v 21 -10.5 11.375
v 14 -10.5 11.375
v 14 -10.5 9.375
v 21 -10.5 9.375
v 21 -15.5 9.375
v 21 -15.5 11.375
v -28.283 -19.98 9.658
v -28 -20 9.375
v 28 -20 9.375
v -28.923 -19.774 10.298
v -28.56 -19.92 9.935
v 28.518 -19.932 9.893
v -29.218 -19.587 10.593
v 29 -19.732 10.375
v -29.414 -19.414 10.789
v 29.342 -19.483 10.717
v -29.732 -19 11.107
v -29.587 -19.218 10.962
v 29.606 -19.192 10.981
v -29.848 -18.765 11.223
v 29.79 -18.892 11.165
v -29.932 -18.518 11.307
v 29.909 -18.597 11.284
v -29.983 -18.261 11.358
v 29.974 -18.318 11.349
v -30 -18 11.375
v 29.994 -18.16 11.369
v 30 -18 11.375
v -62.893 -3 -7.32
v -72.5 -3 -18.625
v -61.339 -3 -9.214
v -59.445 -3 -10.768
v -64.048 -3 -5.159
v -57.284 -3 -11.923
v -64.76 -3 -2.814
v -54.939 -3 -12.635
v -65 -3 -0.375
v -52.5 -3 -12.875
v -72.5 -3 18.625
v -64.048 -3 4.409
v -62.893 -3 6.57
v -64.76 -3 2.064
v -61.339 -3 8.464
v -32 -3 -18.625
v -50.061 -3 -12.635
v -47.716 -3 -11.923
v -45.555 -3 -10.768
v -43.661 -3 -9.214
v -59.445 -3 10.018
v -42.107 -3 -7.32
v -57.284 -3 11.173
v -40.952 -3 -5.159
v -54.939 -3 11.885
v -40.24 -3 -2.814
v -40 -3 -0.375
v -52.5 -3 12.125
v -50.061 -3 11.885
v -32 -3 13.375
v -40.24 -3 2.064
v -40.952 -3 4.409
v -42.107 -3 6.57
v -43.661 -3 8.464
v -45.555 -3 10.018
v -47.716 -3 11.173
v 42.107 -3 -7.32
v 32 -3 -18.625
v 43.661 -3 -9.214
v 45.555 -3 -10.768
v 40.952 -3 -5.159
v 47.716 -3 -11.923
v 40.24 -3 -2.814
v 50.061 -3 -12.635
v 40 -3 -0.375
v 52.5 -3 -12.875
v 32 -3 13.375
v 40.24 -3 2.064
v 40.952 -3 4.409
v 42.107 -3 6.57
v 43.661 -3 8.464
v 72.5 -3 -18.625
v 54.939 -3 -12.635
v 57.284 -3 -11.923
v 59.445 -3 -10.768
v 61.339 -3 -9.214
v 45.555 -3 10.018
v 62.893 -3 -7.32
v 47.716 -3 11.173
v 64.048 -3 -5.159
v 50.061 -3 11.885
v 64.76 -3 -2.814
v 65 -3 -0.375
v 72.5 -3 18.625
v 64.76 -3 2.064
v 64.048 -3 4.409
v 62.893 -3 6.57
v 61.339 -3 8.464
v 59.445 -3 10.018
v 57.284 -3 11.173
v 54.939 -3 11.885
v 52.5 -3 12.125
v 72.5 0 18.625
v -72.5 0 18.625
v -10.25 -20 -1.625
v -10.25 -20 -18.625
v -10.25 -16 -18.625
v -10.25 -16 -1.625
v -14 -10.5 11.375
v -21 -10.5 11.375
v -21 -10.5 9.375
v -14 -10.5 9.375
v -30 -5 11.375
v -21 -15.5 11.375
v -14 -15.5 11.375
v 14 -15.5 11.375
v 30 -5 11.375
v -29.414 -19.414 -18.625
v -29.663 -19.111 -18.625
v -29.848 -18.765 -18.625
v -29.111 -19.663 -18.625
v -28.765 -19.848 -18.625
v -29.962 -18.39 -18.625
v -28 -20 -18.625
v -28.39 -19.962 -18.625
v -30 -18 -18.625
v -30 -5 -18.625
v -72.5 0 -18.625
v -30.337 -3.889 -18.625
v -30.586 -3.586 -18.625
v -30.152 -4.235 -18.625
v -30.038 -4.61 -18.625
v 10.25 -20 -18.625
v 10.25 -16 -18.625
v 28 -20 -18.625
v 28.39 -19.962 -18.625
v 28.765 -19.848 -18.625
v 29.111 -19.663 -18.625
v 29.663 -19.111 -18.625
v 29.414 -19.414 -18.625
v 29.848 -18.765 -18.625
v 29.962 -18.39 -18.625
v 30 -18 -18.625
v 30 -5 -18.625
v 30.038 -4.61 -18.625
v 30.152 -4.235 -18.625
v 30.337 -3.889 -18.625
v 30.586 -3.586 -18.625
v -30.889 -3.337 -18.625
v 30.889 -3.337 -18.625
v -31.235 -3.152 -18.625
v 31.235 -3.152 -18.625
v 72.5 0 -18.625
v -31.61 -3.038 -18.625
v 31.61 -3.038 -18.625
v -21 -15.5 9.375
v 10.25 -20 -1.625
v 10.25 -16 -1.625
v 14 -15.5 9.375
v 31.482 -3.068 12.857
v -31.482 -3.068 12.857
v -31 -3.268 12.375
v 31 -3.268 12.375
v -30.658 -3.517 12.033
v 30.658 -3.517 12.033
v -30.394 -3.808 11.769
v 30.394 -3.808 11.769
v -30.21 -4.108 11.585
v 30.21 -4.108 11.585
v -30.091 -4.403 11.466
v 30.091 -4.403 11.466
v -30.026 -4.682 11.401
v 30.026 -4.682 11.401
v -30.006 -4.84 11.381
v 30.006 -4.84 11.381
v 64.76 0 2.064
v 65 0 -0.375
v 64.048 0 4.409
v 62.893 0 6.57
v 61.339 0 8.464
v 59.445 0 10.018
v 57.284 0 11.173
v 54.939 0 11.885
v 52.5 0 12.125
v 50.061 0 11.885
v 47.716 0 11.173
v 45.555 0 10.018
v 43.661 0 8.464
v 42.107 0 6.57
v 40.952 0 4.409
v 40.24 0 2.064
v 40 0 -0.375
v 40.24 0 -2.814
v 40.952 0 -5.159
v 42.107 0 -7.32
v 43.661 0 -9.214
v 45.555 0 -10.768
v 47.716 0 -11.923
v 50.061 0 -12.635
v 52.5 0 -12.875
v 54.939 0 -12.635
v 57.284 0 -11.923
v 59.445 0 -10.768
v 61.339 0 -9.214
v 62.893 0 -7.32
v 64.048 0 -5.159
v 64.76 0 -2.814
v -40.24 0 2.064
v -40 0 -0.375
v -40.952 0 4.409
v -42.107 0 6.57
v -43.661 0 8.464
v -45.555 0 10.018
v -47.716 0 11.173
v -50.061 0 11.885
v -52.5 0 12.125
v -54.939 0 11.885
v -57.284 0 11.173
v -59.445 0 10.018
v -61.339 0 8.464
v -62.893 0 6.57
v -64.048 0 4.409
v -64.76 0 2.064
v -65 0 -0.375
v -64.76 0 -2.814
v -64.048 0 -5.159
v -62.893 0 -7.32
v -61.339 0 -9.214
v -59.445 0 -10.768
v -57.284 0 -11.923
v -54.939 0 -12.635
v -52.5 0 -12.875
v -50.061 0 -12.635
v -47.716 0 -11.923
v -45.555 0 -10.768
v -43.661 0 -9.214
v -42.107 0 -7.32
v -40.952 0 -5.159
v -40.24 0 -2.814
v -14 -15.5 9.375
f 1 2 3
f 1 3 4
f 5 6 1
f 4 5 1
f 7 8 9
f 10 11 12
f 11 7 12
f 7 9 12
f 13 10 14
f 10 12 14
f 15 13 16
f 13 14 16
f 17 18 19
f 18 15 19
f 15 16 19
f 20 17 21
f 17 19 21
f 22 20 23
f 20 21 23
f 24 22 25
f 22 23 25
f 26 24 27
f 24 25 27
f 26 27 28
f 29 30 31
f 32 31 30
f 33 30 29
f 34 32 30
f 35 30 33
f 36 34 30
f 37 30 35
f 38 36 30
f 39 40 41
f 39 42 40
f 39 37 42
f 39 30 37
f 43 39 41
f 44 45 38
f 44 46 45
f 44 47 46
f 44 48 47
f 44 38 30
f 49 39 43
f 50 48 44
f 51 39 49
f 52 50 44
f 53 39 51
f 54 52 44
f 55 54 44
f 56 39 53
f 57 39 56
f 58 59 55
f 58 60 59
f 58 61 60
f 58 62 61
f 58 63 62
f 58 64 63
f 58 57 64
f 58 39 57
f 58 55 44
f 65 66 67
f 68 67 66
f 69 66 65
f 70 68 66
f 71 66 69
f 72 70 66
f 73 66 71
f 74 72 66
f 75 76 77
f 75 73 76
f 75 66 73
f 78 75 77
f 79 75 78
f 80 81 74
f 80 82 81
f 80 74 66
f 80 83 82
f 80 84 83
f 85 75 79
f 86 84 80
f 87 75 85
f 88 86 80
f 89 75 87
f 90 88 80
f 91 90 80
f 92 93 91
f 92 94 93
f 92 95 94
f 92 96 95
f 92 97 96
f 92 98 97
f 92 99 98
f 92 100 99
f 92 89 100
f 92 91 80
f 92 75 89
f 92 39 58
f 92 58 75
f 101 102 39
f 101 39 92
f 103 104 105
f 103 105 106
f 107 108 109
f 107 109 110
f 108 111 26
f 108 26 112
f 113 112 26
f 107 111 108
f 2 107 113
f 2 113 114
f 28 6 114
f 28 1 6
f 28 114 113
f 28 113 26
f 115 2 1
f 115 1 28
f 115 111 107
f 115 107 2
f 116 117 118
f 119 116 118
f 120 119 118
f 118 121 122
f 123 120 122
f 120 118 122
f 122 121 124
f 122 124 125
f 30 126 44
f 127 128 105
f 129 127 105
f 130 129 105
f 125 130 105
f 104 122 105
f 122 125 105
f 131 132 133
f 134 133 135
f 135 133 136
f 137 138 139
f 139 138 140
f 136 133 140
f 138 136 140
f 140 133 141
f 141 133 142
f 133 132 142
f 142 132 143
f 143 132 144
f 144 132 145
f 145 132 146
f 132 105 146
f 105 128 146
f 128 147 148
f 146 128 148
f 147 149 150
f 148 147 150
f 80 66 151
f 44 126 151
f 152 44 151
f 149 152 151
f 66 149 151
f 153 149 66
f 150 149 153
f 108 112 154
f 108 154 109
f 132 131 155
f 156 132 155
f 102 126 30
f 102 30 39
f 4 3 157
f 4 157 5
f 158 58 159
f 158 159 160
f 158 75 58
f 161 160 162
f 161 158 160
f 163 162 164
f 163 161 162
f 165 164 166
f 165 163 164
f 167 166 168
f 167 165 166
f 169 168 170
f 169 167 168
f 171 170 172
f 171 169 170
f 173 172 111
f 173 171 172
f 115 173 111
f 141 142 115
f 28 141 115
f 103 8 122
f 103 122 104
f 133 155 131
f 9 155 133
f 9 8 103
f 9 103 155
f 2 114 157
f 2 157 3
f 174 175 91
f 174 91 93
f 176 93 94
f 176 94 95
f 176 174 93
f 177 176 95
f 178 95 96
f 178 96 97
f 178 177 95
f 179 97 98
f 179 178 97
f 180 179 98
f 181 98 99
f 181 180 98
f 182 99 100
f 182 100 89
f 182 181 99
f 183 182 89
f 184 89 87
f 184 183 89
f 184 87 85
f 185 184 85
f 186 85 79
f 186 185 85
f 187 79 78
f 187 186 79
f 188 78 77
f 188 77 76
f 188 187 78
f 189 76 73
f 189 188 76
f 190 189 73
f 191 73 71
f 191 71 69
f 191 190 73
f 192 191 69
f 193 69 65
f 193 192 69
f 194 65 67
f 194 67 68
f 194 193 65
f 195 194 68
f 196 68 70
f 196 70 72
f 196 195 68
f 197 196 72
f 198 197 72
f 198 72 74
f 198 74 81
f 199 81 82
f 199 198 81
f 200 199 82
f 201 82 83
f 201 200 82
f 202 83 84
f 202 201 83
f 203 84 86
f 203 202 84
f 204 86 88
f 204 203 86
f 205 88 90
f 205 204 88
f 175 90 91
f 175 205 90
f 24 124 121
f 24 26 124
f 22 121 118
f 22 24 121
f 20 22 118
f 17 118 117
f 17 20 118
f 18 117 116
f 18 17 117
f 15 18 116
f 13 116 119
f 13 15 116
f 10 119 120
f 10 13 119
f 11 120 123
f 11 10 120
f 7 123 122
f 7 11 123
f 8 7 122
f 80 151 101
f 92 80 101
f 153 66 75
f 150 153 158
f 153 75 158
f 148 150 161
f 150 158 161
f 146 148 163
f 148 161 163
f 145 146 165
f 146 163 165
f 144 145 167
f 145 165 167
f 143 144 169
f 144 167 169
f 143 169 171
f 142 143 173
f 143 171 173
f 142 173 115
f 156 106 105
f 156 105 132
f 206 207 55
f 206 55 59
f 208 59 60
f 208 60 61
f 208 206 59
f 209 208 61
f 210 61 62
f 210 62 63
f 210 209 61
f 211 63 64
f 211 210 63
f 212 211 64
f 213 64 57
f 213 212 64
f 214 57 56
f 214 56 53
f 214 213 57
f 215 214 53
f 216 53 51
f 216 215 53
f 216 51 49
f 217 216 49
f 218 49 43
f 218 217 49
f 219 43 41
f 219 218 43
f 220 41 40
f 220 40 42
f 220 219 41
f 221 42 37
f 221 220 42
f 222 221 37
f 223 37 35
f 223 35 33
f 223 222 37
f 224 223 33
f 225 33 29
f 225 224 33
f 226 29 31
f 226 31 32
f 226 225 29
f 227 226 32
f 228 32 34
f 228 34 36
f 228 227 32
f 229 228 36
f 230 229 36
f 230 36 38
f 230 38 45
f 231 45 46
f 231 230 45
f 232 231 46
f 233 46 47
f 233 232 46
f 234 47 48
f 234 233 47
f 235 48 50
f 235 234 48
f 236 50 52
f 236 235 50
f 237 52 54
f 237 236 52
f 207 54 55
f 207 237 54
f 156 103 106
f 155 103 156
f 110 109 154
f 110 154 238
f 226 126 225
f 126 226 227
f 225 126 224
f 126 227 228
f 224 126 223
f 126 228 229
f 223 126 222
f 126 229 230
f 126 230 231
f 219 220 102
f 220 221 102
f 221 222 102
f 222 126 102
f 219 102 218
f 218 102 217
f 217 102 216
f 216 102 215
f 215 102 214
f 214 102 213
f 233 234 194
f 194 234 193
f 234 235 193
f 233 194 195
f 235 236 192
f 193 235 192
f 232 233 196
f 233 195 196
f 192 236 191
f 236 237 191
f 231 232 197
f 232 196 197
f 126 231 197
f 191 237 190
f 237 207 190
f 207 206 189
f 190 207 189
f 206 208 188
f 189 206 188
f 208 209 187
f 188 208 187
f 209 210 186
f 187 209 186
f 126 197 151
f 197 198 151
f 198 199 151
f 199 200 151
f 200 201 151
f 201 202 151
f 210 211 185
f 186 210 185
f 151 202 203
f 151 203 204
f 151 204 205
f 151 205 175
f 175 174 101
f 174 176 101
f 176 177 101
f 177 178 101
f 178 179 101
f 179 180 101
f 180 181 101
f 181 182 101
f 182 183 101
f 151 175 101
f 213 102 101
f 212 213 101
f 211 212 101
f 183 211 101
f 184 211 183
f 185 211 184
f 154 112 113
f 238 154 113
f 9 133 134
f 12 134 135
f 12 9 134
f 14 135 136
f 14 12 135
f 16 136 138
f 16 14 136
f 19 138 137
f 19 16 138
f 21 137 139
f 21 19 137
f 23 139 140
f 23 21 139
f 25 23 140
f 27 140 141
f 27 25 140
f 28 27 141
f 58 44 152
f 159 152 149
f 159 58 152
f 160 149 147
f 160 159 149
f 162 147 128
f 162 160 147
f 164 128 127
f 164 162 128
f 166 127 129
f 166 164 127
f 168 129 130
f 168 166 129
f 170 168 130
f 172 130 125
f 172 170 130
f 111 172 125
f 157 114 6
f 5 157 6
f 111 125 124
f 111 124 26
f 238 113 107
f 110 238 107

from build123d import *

# Parameters (mm, degrees)
F0_W     = 145
F0_H     = 37.25
F0_R     = 12.5
F1_DEPTH = 3
F2_W     = 60
F2_H     = 30
F3_DEPTH = 17
F4_W     = 7
F4_H     = 5
F5_DEPTH = 2
F6_R     = 2
F7_W     = 20.5
F7_H     = 17
F8_DEPTH = 4


with BuildPart() as f1:
    # F0 (on Front) → F1 (new body)
    with BuildSketch(Plane.XZ):
        Rectangle(F0_W, F0_H)
        with Locations((-52.5, -0.375)):
            Circle(F0_R, mode=Mode.SUBTRACT)
        with Locations((52.5, -0.375)):
            Circle(F0_R, mode=Mode.SUBTRACT)
    extrude(amount=F1_DEPTH)

    # F2 (on face) → F3 (join)
    with BuildSketch(Plane.XZ.offset(3)):
        with Locations((0, -3.625)):
            Rectangle(F2_W, F2_H)
    extrude(amount=F3_DEPTH)

    # F4 (on face) → F5 (cut)
    with BuildSketch(Plane.XY.offset(11.375)):
        with Locations((-17.5, -13)):
            Rectangle(F4_W, F4_H)
        with Locations((17.5, -13)):
            Rectangle(F4_W, F4_H)
    extrude(amount=-F5_DEPTH, mode=Mode.SUBTRACT)

    # F6
    f6_edges = [f1.edges().sort_by_distance(p)[0] for p in [
        (0, -3, 11.375),
        (30, -3, -3.625),
        (-30, -3, -3.625),
        (-30, -20, -3.625),
        (0, -20, 11.375),
        (30, -20, -3.625),
    ]]
    fillet(f6_edges, radius=F6_R)

    # F7 (on face) → F8 (cut)
    with BuildSketch(Plane.XZ.offset(20)):
        with Locations((0, -10.125)):
            Rectangle(F7_W, F7_H)
    extrude(amount=-F8_DEPTH, mode=Mode.SUBTRACT)


solid = f1.part
